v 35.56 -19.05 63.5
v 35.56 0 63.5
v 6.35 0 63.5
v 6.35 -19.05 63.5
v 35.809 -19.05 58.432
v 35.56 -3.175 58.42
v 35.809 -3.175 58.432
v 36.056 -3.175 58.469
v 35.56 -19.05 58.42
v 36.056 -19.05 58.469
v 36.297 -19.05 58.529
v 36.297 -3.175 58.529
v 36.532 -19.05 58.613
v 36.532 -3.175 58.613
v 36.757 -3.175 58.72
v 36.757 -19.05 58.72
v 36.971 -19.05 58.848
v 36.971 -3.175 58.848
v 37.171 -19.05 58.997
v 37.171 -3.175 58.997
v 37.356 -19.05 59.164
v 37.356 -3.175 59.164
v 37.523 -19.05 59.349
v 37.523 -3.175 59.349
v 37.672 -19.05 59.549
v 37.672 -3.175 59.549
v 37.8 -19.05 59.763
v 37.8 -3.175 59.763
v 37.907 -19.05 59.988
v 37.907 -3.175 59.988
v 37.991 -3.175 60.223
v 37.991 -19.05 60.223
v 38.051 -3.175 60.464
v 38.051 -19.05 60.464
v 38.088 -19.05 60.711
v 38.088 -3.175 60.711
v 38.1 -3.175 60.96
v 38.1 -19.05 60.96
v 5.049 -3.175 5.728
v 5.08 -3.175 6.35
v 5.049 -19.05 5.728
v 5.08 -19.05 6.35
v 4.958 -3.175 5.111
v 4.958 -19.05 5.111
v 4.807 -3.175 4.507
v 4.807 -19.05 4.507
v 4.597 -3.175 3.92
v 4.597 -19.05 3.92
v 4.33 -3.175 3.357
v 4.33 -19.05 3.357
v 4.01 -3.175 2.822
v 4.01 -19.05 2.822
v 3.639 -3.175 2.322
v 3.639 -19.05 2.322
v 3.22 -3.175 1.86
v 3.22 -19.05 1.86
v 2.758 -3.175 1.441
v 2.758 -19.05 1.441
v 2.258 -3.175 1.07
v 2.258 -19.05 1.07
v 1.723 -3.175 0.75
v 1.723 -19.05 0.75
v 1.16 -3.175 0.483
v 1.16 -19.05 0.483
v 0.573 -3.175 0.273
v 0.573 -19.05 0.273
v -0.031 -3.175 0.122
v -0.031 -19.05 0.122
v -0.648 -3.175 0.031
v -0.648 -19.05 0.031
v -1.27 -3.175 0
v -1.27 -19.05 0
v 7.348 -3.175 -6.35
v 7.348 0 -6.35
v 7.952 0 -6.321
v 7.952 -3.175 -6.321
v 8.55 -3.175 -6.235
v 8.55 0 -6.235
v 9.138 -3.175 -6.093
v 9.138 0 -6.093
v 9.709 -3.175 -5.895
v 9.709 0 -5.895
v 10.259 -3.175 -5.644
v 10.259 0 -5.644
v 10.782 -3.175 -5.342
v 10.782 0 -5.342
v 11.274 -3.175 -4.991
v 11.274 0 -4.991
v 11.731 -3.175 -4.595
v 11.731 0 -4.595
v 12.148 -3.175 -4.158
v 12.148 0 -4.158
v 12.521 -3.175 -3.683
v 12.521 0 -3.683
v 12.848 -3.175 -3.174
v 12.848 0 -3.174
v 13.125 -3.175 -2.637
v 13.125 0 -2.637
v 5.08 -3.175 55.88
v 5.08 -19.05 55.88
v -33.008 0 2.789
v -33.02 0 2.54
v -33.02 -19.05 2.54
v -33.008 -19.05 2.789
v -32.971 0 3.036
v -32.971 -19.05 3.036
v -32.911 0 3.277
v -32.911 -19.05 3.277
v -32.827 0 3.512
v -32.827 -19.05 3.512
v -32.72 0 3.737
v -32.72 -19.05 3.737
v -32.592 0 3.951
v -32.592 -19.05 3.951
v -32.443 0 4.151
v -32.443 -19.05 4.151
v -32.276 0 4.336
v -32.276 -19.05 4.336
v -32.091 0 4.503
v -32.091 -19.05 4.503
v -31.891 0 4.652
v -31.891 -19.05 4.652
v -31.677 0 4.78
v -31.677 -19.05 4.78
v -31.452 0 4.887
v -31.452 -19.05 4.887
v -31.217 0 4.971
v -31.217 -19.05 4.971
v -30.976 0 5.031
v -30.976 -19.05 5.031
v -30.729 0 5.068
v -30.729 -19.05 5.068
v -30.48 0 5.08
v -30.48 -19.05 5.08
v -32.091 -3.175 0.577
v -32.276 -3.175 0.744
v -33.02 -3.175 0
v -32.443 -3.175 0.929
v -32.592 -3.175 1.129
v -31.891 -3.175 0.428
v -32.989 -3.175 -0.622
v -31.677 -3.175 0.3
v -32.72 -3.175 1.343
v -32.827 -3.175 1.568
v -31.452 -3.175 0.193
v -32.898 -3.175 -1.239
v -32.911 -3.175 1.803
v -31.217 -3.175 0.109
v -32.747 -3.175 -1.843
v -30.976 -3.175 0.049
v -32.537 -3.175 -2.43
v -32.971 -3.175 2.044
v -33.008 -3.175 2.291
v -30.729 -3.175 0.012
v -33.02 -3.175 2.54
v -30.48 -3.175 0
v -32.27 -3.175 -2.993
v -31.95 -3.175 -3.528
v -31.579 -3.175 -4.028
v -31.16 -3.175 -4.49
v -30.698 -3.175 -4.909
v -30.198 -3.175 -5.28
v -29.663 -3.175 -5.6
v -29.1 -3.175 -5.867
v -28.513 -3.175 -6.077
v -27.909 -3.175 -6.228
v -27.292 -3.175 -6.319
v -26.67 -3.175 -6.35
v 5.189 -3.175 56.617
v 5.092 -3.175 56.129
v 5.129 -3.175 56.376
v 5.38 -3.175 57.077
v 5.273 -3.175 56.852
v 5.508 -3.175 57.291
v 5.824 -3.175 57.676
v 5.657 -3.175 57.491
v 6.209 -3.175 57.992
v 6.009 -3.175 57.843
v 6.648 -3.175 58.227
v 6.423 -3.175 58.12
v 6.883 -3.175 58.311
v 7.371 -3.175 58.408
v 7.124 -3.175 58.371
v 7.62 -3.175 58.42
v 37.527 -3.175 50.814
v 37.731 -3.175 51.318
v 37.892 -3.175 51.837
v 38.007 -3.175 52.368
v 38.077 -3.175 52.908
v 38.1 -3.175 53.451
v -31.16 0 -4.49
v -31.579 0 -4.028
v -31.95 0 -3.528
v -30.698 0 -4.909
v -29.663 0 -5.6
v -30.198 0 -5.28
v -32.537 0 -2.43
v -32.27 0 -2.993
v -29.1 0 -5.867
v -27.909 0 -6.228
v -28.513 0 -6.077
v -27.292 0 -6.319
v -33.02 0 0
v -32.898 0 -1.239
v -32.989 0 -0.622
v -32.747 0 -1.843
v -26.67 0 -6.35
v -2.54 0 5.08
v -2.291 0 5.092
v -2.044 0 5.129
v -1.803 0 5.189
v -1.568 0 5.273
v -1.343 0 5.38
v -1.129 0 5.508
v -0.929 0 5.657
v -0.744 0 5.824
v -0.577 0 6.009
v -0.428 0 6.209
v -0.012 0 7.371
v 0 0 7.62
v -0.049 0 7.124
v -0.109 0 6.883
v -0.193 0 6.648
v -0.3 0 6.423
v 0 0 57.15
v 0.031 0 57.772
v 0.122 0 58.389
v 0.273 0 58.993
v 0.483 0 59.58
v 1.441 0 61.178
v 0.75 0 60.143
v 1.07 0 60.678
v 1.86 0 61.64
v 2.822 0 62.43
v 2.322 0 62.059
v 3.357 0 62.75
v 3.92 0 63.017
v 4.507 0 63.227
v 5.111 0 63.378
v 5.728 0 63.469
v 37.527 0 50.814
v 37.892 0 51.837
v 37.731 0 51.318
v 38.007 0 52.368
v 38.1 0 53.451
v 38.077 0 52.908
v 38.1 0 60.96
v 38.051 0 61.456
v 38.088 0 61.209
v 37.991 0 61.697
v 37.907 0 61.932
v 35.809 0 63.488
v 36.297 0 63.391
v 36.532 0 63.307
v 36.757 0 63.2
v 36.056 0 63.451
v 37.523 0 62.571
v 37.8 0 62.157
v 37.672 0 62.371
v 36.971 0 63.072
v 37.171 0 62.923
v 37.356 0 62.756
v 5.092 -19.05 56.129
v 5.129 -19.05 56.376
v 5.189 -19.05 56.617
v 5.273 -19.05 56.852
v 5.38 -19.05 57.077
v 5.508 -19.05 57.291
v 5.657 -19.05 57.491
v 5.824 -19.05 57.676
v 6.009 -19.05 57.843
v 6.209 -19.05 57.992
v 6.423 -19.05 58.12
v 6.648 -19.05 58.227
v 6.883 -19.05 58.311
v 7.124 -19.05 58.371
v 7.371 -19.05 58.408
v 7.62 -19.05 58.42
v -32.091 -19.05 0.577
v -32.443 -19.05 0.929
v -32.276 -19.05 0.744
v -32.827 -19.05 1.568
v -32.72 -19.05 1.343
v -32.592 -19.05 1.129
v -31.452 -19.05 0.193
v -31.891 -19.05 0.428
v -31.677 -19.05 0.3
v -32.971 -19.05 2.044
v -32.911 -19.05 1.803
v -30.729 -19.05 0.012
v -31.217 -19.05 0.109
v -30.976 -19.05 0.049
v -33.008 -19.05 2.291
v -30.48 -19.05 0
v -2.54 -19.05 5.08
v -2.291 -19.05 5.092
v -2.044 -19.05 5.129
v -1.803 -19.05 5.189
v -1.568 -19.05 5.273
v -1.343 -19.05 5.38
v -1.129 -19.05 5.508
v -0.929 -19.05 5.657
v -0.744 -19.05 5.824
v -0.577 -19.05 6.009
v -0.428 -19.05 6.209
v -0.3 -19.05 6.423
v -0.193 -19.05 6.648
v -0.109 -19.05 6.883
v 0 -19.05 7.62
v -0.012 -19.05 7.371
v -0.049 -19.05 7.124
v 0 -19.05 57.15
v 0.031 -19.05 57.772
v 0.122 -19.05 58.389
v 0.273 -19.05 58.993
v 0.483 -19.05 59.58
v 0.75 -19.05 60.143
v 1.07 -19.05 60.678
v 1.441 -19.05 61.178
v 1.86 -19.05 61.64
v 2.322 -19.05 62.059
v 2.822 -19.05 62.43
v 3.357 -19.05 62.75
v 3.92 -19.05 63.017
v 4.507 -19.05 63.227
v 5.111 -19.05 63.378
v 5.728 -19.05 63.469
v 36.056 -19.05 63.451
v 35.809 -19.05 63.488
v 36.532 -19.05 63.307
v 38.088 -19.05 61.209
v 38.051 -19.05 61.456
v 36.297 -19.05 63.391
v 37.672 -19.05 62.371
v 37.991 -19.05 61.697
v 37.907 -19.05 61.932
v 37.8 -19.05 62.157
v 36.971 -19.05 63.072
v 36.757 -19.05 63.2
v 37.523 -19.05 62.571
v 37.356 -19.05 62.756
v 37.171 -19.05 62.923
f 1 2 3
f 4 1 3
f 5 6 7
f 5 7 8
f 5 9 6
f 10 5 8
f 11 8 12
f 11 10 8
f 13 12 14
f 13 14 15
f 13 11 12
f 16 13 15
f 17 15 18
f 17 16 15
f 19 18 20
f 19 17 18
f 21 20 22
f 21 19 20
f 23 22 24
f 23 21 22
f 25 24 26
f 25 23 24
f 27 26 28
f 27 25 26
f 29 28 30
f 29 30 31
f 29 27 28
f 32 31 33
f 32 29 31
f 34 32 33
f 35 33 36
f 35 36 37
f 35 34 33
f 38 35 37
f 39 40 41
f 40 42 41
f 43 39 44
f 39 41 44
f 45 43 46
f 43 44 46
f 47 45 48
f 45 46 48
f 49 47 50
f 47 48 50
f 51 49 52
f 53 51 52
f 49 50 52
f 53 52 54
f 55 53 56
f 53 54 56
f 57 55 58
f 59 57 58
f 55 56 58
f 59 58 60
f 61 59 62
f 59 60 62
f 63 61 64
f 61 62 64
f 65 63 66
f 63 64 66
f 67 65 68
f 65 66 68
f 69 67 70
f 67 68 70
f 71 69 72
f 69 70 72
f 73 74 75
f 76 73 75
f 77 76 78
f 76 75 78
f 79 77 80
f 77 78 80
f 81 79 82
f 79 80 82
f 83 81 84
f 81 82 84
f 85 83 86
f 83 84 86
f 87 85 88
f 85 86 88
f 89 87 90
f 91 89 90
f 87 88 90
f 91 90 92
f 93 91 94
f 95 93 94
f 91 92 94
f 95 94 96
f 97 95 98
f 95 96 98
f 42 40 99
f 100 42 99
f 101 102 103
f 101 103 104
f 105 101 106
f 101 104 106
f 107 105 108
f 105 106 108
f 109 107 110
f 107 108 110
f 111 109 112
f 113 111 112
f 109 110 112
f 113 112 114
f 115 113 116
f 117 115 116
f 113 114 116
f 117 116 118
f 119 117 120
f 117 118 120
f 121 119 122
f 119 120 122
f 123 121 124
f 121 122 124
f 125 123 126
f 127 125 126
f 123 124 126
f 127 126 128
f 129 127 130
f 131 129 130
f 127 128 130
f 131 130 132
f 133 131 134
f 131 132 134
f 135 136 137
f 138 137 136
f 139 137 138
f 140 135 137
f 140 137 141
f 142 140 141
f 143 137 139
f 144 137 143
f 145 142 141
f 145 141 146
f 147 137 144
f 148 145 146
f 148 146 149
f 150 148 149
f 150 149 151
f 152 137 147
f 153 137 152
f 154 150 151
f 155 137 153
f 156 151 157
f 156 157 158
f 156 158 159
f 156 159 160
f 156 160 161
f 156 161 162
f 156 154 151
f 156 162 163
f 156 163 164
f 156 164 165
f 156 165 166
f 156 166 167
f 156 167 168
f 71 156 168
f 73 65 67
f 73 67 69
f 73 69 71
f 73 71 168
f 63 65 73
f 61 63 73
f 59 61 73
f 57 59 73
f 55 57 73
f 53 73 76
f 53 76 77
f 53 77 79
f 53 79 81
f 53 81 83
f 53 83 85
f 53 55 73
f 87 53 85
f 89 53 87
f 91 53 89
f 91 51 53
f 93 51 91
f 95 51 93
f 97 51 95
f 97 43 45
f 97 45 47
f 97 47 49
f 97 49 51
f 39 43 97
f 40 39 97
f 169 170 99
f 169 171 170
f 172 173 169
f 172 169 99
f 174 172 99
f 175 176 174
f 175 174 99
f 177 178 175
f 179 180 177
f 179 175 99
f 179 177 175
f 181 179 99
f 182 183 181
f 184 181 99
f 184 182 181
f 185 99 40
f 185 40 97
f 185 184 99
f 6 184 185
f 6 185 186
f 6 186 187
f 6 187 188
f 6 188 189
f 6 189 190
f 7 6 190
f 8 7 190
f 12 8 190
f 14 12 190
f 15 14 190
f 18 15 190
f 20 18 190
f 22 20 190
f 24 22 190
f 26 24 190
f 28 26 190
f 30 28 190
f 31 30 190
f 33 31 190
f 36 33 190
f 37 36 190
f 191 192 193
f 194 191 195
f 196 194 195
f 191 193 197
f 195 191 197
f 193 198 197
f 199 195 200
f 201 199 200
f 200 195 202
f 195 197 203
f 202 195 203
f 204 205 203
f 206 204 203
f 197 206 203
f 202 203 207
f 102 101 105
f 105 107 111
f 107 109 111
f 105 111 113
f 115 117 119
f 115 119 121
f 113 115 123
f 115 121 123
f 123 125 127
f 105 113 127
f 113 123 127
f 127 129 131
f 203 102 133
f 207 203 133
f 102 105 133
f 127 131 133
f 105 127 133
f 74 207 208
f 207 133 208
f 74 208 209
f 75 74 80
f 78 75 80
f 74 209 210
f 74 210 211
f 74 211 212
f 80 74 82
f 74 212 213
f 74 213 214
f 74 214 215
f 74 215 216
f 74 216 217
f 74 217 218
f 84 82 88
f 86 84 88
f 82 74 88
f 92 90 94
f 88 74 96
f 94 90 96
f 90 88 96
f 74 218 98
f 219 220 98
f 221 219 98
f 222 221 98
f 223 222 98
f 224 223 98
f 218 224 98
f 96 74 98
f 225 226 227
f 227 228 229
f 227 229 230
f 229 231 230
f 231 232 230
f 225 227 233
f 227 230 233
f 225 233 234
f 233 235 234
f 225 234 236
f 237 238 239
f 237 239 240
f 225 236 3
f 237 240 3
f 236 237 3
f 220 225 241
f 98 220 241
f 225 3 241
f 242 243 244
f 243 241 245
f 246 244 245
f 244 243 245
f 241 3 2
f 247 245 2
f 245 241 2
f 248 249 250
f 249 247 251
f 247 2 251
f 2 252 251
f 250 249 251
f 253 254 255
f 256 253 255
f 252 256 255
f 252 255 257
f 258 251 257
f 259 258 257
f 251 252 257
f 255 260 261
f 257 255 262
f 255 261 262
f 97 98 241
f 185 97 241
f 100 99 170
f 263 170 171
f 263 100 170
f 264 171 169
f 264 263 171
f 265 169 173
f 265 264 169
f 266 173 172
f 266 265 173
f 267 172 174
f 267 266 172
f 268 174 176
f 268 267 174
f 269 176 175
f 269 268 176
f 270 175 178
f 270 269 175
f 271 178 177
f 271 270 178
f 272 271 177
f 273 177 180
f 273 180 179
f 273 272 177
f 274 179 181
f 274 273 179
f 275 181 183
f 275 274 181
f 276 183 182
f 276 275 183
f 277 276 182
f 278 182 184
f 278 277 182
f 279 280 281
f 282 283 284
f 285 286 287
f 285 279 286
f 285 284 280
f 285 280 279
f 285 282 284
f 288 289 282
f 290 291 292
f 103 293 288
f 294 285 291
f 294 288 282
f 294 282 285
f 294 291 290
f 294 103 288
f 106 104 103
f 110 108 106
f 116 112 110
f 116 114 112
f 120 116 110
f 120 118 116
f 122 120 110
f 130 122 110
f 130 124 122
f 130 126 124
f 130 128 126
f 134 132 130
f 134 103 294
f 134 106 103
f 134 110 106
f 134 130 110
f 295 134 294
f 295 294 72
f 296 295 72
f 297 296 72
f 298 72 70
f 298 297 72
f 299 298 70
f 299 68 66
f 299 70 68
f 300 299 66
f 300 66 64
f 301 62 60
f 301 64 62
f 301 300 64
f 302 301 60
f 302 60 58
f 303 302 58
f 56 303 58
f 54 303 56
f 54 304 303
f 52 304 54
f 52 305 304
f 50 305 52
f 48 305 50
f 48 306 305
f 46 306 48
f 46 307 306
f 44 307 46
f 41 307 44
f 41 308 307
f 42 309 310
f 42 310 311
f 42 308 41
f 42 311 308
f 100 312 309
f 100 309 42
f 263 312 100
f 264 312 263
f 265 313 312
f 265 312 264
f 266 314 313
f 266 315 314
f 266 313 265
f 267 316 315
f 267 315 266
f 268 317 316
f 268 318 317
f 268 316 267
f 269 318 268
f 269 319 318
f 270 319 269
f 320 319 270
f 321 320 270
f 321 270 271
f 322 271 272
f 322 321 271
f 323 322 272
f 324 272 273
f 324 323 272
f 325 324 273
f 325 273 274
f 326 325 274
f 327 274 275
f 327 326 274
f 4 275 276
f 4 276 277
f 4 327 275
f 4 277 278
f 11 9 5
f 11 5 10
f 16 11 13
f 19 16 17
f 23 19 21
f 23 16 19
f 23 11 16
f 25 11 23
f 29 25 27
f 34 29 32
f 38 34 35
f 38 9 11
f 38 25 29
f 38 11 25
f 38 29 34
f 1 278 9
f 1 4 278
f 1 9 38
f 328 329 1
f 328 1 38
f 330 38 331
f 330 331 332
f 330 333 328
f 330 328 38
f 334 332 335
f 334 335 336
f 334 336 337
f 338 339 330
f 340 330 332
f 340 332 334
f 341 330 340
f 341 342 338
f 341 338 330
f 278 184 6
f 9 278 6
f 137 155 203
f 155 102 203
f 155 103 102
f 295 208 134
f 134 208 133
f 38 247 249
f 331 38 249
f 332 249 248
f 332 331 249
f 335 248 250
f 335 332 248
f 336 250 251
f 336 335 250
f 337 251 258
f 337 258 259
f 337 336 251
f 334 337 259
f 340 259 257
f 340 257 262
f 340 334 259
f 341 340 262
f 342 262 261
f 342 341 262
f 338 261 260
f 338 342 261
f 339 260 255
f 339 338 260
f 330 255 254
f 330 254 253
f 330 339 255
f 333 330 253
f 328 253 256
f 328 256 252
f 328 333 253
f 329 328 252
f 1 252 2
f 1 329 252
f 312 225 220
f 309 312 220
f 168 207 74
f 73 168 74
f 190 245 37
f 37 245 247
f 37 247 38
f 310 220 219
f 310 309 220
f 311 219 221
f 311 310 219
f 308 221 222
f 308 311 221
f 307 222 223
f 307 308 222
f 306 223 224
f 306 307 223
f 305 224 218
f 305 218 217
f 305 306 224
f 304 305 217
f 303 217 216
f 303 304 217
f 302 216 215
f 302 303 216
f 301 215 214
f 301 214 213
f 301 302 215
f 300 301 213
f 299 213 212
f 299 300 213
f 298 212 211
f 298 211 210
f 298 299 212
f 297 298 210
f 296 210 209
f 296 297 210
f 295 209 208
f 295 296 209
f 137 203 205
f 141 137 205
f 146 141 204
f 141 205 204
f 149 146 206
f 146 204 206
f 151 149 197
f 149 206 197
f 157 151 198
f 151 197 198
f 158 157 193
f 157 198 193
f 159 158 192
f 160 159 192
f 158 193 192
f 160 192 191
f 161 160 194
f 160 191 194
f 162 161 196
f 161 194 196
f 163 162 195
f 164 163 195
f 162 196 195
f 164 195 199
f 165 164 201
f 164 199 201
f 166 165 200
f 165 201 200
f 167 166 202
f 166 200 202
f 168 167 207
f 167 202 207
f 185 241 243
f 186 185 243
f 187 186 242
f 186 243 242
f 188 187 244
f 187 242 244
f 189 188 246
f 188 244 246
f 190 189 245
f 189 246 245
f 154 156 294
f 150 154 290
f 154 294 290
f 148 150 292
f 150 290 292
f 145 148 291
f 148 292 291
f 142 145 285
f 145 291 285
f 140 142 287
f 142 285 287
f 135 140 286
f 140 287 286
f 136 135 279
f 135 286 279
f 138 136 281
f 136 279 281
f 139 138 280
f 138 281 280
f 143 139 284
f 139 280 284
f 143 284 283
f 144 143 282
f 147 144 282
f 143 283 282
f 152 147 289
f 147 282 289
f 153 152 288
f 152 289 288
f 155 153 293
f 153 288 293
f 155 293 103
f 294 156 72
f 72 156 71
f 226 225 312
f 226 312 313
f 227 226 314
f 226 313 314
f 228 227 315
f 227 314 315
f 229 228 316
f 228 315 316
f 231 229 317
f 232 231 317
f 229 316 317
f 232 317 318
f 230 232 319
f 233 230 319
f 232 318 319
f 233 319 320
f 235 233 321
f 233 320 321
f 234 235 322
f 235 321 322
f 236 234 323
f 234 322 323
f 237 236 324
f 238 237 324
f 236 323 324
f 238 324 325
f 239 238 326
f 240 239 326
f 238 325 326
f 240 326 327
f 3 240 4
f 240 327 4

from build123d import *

# Parameters (mm, degrees)
F1_DEPTH = 19.05
F2_DEPTH = 3.175
F3_R     = 6.35
F4_R     = 2.53999
F5_R     = 2.54


# Not quite as in the source:
# - a fillet or chamfer is up to 0.001 mm smaller than in the source, because OpenCascade refuses the exact size


with BuildPart() as f1:
    # F0 (on Front) → F1 (new body)
    with BuildSketch(Plane.XZ):
        Polygon((-33.02, 0), (0, 0), (5.08, 0), (5.08, 5.08), (5.08, 58.42), (38.1, 58.42), (38.1, 63.5), (5.08, 63.5), (0, 63.5), (0, 58.42), (0, 5.08), (-33.02, 5.08), align=None)
    extrude(amount=F1_DEPTH)

    # F0 (on Front) → F2 (join)
    with BuildSketch(Plane.XZ):
        with BuildLine():
            Line((5.08, 0), (0, 0))
            Line((0, 0), (-33.02, 0))
            ThreePointArc((-33.02, 0), (-31.1601280605, -4.4901280605), (-26.67, -6.35))
            Line((-26.67, -6.35), (7.3484978099, -6.35))
            ThreePointArc((7.3484978099, -6.35), (10.7819271621, -5.3417284546), (13.1250166344, -2.6371064199))
            Line((13.1250166344, -2.6371064199), (37.5265188245, 50.8138031394))
            ThreePointArc((37.5265188245, 50.8138031394), (37.9549735912, 52.1015383235), (38.1, 53.4509095593))
            Line((38.1, 53.4509095593), (38.1, 58.42))
            Line((38.1, 58.42), (5.08, 58.42))
            Line((5.08, 58.42), (5.08, 5.08))
            Line((5.08, 5.08), (5.08, 0))
        make_face()
    extrude(amount=F2_DEPTH)

    # F3
    f3_edges = [f1.edges().sort_by_distance(p)[0] for p in [
        (0, -9.525, 63.5),
        (5.08, -11.1125, 0),
    ]]
    fillet(f3_edges, radius=F3_R)

    # F4 (radius 2.54 in the source; OpenCascade refuses exactly that, so slightly less here)
    f4_edges = [f1.edges().sort_by_distance(p)[0] for p in [
        (-33.02, -11.1125, 0),
        (-33.02, -1.5875, 0),
        (-33.02, -9.525, 5.08),
        (38.1, -11.1125, 58.42),
        (38.1, -9.525, 63.5),
    ]]
    fillet(f4_edges, radius=F4_R)

    # F5
    f5_edges = [f1.edges().sort_by_distance(p)[0] for p in [
        (5.08, -11.1125, 58.42),
        (0, -9.525, 5.08),
    ]]
    fillet(f5_edges, radius=F5_R)


solid = f1.part
